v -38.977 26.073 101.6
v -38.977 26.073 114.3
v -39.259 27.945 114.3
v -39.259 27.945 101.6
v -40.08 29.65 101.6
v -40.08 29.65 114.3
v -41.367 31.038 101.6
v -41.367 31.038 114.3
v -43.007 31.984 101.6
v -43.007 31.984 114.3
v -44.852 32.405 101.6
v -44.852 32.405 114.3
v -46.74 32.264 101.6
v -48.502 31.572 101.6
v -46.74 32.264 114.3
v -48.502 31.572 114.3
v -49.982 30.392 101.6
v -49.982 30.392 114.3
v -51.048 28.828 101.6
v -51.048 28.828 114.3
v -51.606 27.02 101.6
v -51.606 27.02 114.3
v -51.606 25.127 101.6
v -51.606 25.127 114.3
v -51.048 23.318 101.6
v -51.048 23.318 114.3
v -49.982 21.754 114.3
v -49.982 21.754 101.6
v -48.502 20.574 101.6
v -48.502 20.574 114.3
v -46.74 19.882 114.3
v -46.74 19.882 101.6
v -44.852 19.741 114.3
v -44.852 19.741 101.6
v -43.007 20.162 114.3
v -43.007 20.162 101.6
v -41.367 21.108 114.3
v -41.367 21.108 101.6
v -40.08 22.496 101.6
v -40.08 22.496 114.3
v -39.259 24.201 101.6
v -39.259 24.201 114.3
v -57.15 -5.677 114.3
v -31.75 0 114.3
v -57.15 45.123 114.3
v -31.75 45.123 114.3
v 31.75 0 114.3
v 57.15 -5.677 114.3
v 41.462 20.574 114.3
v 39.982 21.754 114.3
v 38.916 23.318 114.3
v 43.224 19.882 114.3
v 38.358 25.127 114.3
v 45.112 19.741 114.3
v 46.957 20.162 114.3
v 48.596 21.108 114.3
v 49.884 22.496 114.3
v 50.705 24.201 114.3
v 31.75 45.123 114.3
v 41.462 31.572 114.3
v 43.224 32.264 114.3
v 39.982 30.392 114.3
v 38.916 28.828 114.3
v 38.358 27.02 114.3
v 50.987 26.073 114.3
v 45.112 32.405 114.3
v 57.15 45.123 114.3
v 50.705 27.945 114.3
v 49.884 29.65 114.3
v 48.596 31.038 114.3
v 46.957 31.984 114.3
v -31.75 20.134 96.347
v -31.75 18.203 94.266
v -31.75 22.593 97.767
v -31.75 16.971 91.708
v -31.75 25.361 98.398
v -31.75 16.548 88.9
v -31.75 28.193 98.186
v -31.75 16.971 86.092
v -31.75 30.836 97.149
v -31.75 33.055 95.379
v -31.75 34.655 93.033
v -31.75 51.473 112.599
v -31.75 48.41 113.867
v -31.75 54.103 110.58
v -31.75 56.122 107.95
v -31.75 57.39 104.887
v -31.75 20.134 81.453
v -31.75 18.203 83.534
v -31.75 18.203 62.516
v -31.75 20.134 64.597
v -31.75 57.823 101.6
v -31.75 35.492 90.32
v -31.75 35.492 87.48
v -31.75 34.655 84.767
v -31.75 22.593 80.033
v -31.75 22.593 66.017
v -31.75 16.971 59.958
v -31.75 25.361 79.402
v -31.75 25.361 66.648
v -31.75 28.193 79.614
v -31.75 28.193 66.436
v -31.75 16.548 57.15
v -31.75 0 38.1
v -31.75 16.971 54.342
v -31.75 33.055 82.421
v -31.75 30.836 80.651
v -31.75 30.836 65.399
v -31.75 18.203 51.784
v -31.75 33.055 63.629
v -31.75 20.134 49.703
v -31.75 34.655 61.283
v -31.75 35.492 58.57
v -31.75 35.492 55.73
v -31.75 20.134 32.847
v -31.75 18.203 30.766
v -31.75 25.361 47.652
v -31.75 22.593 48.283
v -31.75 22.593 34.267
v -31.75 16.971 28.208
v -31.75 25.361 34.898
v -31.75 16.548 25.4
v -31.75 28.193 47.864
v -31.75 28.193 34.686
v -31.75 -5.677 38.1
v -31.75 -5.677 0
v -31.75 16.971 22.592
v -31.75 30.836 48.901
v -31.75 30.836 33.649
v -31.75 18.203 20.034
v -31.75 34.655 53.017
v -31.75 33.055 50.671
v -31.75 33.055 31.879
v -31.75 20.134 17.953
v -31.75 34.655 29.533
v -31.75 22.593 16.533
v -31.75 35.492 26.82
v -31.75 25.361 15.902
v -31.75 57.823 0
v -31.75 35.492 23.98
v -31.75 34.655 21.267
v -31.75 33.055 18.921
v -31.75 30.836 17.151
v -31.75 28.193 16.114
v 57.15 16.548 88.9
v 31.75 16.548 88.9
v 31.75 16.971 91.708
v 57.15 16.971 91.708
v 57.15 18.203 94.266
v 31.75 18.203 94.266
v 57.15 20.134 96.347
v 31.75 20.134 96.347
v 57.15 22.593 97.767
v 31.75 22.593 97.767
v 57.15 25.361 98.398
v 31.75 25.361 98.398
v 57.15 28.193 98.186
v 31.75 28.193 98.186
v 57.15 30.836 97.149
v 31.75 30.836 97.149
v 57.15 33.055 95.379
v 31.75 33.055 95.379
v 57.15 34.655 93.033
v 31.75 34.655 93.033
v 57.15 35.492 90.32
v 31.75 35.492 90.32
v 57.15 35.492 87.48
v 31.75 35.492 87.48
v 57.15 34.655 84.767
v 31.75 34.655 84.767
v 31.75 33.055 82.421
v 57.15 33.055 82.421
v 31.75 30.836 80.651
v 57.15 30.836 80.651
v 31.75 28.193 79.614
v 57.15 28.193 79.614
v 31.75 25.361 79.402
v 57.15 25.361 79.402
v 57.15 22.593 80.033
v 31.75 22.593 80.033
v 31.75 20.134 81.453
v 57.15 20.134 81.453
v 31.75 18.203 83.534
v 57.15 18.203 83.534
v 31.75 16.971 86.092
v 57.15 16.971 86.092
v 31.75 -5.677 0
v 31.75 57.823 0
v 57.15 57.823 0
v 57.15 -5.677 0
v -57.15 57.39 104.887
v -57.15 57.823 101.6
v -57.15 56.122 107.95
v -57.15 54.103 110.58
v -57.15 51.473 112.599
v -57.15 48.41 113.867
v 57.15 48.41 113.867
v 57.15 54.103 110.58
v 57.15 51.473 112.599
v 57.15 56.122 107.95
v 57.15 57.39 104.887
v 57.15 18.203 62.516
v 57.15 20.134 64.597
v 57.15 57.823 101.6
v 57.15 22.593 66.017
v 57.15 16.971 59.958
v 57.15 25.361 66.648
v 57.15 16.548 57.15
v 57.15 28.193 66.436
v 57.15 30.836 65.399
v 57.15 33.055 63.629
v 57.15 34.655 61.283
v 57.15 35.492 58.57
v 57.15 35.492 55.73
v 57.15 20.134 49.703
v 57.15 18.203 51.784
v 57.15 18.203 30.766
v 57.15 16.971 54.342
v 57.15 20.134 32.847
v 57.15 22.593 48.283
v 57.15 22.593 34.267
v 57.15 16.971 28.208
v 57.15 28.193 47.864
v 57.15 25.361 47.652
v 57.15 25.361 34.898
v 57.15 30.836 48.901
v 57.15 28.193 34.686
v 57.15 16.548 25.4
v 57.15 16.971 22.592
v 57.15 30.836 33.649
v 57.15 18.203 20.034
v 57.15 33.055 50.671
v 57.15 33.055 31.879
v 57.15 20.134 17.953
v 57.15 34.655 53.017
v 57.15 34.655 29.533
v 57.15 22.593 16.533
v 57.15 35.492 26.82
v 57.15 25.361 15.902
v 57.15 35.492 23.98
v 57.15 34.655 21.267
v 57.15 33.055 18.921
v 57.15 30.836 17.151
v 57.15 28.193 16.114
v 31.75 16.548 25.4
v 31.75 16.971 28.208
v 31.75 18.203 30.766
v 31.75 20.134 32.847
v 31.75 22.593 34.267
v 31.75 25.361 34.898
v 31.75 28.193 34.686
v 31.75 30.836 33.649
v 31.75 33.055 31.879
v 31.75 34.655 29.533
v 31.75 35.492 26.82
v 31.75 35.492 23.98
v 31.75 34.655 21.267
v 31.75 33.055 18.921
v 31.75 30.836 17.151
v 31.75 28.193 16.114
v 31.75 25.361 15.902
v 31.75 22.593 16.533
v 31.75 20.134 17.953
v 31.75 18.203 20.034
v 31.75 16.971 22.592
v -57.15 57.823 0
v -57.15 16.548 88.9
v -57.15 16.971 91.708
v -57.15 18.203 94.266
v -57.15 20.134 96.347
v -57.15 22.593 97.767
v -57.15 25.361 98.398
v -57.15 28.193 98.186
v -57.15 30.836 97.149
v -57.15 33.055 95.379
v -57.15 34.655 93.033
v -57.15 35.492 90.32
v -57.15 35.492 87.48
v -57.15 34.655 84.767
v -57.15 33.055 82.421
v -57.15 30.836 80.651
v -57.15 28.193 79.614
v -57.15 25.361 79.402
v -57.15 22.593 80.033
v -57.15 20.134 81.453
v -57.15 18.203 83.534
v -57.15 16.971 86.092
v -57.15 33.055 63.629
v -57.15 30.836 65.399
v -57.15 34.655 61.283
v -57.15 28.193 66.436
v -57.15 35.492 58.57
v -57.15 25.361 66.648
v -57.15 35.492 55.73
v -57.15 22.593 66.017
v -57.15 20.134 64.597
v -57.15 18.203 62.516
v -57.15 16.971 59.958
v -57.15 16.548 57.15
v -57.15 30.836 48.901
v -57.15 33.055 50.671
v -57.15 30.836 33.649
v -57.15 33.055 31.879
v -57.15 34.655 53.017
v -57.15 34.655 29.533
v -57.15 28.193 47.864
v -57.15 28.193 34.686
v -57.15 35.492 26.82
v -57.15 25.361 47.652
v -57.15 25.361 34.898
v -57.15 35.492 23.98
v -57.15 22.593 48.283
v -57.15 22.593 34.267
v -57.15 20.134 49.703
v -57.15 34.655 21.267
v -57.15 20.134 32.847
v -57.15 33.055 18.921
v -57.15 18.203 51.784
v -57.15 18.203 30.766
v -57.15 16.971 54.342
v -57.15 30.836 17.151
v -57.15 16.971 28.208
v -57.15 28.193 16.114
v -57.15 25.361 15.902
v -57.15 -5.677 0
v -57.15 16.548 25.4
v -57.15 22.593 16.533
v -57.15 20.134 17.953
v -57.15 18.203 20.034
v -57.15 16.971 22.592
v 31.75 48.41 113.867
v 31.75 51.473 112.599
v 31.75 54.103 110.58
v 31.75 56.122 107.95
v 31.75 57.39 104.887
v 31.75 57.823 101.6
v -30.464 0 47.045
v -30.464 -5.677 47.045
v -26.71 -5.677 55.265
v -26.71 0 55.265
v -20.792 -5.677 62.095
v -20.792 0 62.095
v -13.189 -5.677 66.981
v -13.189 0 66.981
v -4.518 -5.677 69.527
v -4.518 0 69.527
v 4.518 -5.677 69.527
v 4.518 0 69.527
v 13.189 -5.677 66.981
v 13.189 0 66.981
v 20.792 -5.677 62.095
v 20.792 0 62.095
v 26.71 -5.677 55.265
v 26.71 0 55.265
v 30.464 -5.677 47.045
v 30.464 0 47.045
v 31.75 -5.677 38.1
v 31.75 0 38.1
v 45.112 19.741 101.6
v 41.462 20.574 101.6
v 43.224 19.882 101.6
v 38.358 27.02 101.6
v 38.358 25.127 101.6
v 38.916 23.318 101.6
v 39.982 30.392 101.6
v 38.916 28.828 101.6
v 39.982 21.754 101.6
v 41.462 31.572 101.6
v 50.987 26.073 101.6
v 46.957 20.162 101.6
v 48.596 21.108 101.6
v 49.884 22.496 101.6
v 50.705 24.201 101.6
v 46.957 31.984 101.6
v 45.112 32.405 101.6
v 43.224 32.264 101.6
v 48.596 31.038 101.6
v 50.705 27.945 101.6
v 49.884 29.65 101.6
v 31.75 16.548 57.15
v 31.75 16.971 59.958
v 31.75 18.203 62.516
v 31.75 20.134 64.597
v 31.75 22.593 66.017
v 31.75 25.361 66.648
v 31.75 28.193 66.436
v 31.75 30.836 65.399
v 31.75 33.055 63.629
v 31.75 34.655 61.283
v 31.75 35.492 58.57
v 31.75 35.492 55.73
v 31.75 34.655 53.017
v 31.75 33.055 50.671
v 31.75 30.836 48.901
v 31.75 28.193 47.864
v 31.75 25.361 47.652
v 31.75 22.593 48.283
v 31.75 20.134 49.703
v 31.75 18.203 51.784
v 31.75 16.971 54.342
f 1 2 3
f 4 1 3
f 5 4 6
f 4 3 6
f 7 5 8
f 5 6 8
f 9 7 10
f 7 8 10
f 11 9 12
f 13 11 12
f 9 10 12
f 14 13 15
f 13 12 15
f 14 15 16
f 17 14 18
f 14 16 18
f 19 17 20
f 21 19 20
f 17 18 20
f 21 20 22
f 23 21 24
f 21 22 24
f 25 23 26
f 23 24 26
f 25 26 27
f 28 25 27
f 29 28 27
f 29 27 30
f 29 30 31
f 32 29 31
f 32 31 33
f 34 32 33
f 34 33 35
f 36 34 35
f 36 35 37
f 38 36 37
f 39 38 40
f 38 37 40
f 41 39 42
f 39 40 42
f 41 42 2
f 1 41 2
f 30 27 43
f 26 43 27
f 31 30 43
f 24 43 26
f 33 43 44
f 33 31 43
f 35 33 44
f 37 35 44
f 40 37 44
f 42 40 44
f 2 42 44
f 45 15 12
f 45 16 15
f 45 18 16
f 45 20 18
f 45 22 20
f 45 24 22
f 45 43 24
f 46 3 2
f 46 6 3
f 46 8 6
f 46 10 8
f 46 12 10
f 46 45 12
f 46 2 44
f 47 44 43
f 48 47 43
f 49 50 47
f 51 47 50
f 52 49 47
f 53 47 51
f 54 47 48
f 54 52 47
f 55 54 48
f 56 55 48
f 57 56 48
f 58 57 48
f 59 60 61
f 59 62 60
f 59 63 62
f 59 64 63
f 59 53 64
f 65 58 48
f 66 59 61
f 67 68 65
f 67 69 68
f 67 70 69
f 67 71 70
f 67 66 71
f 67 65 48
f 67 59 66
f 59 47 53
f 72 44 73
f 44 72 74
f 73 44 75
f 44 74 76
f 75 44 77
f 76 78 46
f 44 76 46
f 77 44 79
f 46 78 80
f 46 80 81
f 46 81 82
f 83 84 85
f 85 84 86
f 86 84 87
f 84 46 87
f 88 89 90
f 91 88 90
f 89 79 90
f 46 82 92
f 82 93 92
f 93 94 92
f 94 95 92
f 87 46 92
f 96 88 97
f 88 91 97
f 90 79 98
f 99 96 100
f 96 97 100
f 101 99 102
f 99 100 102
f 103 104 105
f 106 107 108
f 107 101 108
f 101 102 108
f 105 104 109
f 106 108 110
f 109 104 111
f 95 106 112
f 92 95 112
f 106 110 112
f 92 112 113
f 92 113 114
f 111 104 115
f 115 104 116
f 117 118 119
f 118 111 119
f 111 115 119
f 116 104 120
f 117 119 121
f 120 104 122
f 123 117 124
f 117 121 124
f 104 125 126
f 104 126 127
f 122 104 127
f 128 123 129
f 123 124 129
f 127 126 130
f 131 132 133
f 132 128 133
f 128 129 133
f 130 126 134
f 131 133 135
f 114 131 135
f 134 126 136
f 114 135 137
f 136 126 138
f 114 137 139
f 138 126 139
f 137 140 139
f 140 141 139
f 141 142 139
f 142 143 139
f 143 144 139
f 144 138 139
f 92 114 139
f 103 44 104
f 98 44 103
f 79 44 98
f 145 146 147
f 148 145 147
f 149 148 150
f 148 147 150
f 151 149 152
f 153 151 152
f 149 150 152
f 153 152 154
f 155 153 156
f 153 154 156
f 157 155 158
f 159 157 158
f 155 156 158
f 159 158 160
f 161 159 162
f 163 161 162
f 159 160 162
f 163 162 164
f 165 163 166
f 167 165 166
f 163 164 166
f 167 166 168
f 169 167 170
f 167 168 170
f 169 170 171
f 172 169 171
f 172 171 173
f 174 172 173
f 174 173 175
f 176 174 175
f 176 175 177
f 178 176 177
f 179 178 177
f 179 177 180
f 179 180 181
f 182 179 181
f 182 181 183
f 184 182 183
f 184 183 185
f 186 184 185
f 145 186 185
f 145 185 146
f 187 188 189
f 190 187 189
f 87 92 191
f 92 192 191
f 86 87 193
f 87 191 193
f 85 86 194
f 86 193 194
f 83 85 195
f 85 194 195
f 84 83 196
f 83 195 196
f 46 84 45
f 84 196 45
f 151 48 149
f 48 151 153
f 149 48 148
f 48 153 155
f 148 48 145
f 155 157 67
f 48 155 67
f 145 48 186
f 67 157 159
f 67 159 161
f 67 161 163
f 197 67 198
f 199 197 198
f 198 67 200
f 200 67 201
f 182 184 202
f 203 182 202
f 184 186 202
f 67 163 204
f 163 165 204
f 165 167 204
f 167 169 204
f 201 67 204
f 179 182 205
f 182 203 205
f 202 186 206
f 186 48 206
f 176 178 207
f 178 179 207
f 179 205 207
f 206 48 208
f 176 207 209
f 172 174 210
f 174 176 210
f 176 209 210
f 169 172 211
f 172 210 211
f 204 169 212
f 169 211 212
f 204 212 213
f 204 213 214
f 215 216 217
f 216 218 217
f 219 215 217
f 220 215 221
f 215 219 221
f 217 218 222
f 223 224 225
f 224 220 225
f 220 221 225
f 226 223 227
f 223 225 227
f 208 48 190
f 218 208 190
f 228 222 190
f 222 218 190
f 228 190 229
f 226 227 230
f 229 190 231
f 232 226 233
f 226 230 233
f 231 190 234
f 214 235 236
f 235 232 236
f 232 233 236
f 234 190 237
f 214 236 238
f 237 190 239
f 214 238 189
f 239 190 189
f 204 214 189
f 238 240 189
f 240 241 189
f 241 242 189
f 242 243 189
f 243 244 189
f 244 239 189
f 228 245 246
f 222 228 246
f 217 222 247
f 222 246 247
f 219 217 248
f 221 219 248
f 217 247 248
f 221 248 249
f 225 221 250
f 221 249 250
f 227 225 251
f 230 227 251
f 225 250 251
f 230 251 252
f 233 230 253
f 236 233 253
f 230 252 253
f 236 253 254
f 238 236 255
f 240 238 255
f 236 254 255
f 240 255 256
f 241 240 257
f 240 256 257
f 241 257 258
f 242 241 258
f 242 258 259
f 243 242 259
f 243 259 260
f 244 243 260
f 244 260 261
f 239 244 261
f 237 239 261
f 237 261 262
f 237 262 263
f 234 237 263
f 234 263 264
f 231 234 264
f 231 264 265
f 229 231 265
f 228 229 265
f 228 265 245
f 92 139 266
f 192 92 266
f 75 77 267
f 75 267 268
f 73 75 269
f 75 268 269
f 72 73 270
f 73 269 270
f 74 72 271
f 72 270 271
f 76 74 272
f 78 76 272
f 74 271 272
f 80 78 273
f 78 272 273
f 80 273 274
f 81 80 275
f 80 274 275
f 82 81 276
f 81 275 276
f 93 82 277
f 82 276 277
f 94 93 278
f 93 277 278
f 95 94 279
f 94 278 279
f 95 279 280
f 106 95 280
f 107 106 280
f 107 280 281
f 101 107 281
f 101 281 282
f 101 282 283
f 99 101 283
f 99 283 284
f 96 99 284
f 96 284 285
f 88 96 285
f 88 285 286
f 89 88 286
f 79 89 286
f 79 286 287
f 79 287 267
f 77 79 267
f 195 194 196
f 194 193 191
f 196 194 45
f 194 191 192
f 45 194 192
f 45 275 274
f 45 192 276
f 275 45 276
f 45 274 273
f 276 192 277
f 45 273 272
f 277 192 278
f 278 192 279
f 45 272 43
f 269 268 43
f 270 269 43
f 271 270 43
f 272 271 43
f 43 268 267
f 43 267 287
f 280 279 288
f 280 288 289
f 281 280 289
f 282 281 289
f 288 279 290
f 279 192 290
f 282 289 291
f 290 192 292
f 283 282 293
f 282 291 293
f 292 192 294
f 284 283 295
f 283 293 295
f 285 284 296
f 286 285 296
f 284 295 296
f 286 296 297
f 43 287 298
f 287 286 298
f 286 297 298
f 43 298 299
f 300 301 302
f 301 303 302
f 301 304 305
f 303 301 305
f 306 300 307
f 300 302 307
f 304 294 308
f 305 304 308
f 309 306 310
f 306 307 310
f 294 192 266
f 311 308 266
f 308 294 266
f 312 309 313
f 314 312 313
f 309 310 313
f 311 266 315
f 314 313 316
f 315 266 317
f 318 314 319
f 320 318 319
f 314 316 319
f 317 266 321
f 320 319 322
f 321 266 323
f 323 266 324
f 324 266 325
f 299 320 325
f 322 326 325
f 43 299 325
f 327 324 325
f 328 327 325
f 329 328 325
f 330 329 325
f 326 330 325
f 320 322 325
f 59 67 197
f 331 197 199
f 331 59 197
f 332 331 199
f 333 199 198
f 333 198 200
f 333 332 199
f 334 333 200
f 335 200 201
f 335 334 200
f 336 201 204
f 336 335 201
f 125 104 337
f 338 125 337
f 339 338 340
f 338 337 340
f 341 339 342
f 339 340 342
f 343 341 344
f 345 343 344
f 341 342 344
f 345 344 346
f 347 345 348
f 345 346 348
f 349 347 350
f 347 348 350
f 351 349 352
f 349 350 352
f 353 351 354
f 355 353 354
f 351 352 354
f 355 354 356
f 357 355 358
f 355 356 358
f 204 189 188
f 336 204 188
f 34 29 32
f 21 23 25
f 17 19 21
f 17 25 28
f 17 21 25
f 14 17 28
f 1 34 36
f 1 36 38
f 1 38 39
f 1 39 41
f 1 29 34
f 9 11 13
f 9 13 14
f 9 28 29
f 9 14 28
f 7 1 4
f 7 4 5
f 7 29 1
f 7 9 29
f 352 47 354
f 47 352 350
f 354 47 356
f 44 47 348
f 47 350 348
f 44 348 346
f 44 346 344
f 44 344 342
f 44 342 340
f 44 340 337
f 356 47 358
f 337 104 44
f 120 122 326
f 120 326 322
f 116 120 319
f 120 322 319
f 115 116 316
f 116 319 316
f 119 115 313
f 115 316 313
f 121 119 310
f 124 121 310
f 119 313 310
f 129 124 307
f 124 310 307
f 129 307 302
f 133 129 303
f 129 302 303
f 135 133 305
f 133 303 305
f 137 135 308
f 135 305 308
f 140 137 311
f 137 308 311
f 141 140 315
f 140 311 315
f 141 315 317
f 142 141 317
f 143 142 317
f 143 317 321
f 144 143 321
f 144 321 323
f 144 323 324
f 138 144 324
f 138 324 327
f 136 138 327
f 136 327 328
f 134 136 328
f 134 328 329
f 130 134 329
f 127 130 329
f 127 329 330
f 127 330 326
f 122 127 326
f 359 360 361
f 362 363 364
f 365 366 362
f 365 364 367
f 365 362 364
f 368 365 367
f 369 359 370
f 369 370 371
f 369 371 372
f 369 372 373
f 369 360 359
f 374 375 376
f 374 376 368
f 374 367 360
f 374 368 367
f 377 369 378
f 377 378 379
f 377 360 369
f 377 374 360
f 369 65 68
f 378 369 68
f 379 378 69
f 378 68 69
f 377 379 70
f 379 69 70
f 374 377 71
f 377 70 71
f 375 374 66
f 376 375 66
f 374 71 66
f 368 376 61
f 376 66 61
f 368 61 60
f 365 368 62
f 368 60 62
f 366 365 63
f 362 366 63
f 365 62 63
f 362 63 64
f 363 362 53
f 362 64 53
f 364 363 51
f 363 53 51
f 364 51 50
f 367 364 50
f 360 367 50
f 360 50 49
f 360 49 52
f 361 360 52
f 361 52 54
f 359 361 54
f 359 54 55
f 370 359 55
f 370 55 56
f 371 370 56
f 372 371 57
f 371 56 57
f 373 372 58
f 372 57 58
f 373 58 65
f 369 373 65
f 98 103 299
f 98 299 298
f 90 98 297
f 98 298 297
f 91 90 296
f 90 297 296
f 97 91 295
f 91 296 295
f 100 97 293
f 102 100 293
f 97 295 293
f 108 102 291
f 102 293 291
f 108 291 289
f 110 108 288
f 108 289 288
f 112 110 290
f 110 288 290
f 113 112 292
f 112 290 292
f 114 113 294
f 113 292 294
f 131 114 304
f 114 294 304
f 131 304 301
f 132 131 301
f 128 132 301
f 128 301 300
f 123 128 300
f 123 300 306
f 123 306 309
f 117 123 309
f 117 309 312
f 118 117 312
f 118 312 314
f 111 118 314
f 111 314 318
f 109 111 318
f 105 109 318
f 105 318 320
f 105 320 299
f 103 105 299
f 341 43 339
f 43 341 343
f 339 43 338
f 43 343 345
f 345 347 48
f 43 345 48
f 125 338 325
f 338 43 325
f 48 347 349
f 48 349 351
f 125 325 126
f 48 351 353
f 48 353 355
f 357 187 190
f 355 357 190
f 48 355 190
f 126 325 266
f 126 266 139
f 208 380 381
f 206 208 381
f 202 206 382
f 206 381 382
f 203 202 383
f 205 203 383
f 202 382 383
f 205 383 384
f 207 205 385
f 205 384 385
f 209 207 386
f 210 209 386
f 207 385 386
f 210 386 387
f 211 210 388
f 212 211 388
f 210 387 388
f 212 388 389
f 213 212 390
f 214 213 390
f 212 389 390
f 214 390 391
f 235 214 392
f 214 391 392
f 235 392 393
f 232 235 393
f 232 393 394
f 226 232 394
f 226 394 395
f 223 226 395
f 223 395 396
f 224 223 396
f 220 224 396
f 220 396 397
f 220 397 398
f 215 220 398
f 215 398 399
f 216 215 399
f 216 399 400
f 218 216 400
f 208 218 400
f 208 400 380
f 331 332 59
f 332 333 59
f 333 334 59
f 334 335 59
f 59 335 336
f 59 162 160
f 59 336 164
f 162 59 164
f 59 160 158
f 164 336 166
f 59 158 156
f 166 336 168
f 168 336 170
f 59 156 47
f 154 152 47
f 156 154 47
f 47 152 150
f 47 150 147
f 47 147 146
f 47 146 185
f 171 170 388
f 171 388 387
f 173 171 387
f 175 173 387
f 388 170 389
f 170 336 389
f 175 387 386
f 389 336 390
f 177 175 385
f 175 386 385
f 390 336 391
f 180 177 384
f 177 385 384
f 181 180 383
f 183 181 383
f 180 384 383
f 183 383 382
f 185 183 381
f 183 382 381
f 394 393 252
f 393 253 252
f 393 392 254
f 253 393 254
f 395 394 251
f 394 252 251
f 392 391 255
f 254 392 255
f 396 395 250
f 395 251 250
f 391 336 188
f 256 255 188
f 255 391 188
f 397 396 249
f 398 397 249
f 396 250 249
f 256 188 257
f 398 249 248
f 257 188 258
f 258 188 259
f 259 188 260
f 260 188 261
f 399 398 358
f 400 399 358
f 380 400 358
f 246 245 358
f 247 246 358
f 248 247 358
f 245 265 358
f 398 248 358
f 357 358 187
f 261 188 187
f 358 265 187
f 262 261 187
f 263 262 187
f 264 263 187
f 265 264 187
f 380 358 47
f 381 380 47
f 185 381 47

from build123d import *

# Parameters (mm, degrees)
F1_DEPTH = 114.3
F2_R     = 9.525
F3_DEPTH = 114.301
F5_DEPTH = 5.6779
F6_R     = 12.7
F7_R     = 6.35
F8_DEPTH = 12.7


with BuildPart() as f1:
    # F0 (on Top) → F1 (new body)
    with BuildSketch(Plane.XY):
        Polygon((-31.75, 57.8231), (-57.15, 57.8231), (-57.15, -5.6769), (57.15, -5.6769), (57.15, 57.8231), (31.75, 57.8231), (31.75, 0), (-31.75, 0), align=None)
    extrude(amount=F1_DEPTH)

    # F2 (on face) → F3 (cut, through all)
    with BuildSketch(Plane(origin=(-57.15, 0, 0), x_dir=(0, -1, 0), z_dir=(-1, 0, 0))):
        with Locations((-26.0731, 25.4)):
            Circle(F2_R)
        with Locations((-26.0731, 88.9)):
            Circle(F2_R)
        with Locations((-26.0731, 57.15)):
            Circle(F2_R)
    extrude(amount=-F3_DEPTH, mode=Mode.SUBTRACT)

    # F4 (on face) → F5 (cut, through all)
    with BuildSketch(Plane(origin=(0, 0, 0), x_dir=(-1, 0, 0), z_dir=(0, 1, 0))):
        with BuildLine():
            Line((-31.75, 38.1), (-31.75, 0))
            Line((-31.75, 0), (31.75, 0))
            Line((31.75, 0), (31.75, 38.1))
            ThreePointArc((31.75, 38.1), (0, 69.85), (-31.75, 38.1))
        make_face()
    extrude(amount=-F5_DEPTH, mode=Mode.SUBTRACT)

    # F6
    f6_edges = [f1.edges().sort_by_distance(p)[0] for p in [
        (44.45, 57.8231, 114.3),
        (-44.45, 57.8231, 114.3),
    ]]
    fillet(f6_edges, radius=F6_R)

    # F7 (on face) → F8 (cut)
    with BuildSketch(Plane.XY.offset(114.3)):
        with Locations((-45.326655, 26.0731)):
            Circle(F7_R)
        with Locations((44.637317, 26.0731)):
            Circle(F7_R)
    extrude(amount=-F8_DEPTH, mode=Mode.SUBTRACT)


solid = f1.part
